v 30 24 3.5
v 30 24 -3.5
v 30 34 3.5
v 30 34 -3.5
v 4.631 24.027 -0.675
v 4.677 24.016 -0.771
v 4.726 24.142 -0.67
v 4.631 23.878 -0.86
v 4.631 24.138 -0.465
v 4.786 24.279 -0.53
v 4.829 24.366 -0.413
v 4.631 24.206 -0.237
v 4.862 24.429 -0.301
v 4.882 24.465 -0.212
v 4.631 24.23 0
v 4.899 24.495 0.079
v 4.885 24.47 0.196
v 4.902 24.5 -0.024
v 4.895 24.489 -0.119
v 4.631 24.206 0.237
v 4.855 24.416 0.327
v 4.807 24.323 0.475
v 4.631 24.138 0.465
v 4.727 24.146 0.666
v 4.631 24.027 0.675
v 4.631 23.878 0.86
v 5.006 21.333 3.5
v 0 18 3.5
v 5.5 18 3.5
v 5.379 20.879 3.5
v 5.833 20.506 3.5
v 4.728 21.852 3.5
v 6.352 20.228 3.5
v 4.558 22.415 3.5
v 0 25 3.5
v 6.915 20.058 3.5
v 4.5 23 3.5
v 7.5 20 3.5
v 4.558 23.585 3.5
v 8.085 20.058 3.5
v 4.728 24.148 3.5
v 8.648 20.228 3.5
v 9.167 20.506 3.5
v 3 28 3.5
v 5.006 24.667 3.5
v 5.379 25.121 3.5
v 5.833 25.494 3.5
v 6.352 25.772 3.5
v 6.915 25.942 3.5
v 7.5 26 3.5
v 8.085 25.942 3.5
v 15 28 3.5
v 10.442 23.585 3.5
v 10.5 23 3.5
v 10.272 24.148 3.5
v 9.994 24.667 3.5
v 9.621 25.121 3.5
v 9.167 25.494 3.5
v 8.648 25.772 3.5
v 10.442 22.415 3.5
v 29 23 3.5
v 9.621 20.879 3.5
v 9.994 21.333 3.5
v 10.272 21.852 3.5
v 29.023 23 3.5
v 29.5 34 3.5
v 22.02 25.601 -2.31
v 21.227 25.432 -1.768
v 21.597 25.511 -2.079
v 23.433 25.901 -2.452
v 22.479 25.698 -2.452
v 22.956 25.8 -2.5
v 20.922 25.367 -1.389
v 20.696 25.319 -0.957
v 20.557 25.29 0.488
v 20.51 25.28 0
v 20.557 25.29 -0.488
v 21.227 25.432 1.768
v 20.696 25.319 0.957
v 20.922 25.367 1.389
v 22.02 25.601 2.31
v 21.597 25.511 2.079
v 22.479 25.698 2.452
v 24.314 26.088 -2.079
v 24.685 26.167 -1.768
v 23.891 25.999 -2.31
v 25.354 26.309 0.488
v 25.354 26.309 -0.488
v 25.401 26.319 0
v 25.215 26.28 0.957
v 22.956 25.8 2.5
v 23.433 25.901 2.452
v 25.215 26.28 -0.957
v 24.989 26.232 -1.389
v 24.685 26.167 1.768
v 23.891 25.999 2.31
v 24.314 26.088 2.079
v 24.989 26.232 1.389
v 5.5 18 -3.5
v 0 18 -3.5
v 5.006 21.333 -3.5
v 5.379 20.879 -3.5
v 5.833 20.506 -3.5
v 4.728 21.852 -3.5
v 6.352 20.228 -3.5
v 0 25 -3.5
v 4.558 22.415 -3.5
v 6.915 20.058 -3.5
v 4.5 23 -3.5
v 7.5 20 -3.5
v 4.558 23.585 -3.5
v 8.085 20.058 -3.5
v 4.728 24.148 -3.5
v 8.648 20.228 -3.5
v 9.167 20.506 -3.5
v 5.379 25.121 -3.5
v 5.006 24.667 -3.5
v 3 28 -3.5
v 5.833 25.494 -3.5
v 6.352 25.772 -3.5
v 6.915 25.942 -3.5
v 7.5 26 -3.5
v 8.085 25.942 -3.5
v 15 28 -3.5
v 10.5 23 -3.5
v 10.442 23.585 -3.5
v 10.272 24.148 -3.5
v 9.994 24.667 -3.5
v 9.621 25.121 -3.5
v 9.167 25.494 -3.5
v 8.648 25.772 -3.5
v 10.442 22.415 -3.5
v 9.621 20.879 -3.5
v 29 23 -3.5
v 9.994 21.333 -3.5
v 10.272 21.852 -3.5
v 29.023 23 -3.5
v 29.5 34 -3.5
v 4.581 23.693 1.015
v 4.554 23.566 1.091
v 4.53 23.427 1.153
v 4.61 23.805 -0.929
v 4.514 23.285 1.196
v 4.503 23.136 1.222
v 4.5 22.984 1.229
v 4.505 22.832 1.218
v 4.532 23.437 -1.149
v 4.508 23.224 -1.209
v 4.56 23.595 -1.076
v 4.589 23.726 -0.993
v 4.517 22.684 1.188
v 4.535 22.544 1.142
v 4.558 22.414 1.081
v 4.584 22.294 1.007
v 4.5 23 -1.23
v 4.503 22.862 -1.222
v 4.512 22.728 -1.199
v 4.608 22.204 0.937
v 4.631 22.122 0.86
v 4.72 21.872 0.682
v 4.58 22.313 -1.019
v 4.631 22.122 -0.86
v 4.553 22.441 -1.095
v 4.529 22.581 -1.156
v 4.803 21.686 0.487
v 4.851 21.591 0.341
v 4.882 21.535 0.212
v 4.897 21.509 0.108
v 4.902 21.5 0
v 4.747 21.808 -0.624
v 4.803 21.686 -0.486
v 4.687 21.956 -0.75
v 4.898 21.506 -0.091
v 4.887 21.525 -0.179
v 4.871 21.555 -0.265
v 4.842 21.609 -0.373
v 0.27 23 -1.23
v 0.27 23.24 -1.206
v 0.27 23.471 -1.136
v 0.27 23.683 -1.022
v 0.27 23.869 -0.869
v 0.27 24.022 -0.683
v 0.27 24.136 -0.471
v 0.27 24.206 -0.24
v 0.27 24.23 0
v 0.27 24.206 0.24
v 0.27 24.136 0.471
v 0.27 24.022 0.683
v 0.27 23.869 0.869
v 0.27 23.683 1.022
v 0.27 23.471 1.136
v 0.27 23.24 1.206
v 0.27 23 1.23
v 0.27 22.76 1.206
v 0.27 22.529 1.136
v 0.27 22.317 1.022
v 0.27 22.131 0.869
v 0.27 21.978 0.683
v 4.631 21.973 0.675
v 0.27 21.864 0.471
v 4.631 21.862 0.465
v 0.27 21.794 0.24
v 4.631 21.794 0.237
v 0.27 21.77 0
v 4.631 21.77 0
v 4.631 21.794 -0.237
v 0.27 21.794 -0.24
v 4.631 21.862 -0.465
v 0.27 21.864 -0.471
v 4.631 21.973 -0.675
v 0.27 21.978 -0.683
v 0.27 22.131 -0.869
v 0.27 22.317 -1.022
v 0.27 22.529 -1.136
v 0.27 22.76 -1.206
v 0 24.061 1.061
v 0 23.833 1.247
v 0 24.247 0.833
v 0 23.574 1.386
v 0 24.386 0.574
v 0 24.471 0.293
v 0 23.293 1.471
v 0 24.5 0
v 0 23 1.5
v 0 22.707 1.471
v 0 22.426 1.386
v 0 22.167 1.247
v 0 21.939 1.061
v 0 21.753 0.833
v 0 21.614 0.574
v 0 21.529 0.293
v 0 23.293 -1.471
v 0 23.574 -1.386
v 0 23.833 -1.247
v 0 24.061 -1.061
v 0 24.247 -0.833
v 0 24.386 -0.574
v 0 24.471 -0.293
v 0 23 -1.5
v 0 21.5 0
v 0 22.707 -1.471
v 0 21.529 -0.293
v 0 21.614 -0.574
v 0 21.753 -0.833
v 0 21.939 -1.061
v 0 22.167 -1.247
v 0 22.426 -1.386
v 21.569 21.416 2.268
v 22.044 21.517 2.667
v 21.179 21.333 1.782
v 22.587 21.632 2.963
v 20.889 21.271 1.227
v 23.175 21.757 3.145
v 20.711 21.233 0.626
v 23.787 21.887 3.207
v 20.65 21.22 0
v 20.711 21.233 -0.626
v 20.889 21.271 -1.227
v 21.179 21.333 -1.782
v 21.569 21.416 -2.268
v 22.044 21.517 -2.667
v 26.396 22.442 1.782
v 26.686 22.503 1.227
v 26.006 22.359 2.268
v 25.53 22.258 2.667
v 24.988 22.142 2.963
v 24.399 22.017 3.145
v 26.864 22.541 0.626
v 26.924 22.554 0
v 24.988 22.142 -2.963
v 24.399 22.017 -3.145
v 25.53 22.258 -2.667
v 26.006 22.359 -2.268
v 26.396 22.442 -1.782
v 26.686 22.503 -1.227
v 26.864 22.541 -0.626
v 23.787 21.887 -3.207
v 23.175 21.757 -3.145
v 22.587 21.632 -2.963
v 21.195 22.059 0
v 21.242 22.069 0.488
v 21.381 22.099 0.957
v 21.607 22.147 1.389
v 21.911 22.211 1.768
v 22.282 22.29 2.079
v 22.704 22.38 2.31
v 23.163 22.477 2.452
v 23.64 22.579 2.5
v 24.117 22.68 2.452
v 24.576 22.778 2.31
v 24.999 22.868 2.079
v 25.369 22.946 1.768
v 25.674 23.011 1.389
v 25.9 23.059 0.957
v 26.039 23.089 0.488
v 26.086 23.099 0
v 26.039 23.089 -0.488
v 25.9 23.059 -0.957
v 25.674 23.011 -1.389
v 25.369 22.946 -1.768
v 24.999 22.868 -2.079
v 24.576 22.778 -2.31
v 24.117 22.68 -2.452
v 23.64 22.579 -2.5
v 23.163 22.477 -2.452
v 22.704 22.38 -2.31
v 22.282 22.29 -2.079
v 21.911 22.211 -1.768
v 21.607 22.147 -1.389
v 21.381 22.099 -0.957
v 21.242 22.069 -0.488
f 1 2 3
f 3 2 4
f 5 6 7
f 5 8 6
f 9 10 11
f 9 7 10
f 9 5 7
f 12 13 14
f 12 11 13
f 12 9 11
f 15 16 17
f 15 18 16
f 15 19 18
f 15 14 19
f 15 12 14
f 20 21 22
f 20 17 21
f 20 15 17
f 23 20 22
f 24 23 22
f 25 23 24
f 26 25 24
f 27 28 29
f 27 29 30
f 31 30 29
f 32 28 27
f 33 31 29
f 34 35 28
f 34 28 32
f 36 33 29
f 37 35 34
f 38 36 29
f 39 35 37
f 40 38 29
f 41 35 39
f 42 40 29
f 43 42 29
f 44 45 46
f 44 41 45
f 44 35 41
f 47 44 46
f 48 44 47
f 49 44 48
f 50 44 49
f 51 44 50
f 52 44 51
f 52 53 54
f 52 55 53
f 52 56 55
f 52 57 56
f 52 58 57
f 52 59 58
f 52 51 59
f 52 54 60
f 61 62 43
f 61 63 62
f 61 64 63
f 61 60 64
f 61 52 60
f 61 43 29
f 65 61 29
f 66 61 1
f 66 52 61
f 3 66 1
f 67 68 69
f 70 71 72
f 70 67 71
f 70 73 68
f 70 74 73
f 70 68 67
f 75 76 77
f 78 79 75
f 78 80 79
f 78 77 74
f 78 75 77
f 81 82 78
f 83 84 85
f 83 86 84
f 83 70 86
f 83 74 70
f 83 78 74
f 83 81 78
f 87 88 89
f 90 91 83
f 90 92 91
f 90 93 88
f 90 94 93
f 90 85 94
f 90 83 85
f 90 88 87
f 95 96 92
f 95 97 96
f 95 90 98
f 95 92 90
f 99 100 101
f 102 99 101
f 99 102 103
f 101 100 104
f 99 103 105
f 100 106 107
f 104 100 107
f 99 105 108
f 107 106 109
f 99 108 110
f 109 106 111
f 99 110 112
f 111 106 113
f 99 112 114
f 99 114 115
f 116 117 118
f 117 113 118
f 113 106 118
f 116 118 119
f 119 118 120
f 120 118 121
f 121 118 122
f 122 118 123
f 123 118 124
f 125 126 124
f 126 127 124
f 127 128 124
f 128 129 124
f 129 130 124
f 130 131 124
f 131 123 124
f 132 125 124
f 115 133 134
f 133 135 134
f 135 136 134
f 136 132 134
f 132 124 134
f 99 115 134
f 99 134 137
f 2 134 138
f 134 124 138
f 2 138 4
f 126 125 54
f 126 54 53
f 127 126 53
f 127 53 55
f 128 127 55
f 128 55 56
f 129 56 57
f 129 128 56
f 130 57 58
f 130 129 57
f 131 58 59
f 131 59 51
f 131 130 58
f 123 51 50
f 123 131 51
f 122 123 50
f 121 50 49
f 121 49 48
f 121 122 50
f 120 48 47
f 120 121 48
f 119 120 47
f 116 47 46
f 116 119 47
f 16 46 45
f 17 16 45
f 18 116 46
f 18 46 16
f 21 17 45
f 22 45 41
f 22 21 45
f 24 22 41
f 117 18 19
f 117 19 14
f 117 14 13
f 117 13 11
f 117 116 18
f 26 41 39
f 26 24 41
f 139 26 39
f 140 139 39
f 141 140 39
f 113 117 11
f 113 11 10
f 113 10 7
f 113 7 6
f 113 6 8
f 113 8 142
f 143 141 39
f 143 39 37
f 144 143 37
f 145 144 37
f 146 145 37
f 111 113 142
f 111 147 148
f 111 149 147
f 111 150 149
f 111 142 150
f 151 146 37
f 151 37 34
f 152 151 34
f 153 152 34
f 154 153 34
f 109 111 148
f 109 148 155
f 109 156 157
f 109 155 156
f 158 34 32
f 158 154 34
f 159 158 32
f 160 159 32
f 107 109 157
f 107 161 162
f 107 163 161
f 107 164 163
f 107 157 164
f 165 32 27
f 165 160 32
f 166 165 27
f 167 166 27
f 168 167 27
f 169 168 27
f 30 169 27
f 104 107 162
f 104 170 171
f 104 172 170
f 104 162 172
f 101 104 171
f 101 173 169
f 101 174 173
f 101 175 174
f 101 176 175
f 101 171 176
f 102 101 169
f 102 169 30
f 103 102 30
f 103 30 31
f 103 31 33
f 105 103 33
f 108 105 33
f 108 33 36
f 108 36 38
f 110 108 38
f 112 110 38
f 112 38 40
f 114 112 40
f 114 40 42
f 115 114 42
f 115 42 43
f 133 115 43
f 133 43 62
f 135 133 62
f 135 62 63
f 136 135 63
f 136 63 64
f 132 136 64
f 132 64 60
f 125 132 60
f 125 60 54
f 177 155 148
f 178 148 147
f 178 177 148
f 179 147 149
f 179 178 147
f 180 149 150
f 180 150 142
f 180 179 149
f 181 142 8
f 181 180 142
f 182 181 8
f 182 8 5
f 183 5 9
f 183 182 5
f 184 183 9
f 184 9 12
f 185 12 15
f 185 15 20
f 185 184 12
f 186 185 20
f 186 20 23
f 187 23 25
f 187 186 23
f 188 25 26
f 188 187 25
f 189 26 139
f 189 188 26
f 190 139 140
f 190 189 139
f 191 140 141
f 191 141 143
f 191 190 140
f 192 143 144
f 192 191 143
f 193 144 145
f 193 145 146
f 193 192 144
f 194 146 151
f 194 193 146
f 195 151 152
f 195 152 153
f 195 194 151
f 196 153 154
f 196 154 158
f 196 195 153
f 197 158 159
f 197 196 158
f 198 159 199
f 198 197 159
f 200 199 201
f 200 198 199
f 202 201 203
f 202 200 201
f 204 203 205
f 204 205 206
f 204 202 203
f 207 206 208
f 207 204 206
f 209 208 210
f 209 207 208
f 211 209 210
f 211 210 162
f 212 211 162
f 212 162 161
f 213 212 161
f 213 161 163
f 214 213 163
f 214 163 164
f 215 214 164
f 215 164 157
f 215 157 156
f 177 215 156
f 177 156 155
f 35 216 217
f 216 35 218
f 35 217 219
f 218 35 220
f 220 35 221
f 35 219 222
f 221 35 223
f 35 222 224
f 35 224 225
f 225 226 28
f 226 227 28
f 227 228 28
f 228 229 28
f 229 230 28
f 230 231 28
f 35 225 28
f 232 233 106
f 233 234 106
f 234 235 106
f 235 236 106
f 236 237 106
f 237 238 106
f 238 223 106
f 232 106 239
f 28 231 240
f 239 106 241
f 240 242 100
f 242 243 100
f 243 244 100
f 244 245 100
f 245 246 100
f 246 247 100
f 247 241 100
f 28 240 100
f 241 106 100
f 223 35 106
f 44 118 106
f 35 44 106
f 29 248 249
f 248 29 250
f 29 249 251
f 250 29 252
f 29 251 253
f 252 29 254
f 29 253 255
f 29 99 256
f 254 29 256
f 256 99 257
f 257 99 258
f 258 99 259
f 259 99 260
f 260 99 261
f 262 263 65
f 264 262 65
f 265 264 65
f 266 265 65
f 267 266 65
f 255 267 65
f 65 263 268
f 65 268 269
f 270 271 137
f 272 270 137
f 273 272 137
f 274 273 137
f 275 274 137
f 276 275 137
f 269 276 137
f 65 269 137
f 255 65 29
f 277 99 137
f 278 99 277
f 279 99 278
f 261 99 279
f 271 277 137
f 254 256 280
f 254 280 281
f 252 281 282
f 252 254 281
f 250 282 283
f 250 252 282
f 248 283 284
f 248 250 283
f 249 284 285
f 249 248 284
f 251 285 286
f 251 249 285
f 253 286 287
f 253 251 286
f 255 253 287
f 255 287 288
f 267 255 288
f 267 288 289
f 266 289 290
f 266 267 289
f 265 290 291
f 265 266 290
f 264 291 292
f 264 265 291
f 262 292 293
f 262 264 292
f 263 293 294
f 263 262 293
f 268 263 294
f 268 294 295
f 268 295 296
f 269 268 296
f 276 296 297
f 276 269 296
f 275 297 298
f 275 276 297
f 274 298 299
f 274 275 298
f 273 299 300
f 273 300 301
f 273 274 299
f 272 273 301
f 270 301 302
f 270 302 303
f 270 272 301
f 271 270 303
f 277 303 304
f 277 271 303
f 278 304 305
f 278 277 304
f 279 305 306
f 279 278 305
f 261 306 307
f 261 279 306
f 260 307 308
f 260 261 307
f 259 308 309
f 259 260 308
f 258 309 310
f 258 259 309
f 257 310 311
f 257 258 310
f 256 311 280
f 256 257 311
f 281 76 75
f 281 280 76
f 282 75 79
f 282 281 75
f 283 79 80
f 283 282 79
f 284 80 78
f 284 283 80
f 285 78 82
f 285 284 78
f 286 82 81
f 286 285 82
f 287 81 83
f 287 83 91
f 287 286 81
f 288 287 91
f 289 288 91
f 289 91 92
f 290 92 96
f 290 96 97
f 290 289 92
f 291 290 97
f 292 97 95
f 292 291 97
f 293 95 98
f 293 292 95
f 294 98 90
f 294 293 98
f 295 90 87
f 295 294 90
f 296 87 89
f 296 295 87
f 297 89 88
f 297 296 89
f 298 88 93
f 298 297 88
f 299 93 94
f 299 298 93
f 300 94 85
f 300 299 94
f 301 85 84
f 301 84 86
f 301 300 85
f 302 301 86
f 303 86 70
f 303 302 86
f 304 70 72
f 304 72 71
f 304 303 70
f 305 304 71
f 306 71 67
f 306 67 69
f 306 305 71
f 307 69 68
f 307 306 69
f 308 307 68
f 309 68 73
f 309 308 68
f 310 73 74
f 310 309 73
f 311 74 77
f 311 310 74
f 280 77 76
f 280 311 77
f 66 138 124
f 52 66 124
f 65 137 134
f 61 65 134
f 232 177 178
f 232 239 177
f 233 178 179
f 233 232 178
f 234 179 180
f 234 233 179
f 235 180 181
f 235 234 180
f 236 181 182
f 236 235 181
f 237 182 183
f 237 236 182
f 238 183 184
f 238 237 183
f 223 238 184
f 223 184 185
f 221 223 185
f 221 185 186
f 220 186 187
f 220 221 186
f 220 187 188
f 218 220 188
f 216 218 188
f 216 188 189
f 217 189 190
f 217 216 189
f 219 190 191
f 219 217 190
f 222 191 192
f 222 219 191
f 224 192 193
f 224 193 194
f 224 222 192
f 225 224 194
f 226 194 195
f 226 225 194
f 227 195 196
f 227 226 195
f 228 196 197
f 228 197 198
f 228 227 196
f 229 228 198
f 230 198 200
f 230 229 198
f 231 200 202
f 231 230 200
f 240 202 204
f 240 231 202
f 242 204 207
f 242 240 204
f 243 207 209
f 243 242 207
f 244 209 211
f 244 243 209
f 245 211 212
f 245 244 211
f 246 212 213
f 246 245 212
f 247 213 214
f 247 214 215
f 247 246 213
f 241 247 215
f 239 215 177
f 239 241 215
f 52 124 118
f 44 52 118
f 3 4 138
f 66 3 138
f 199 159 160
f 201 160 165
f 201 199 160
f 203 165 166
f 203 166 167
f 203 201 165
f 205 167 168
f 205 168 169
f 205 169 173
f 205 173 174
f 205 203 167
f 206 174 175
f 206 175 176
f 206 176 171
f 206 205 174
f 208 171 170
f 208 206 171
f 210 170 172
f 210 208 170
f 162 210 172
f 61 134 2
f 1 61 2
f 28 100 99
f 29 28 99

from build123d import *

# Parameters (mm, degrees)
BOSS_EXTRUDE1_DEPTH      = 3.5
BOSS_EXTRUDE1_DEPTH_BACK = 3.5
CUT_EXTRUDE1_DEPTH       = 3.5
CUT_EXTRUDE1_DEPTH_BACK  = 3.5
SKETCH2_R                = 3


with BuildPart() as part:
    # Sketch1 → Boss-Extrude1 (new, two sides: drawn at the far end of the back side and taken through both)
    with BuildSketch(Plane.XY.offset(-BOSS_EXTRUDE1_DEPTH_BACK)):
        Polygon((0, 25), (0, 18), (5.5, 18), (29.023150547, 23), (29, 23), (30, 24), (30, 34), (29.5, 34), (15, 28), (3, 28), align=None)
    extrude(amount=BOSS_EXTRUDE1_DEPTH + BOSS_EXTRUDE1_DEPTH_BACK)

    # Sketch2 → Cut-Extrude1 (cut, two sides: drawn at the far end of the back side and taken through both)
    with BuildSketch(Plane.XY.offset(-CUT_EXTRUDE1_DEPTH_BACK)):
        with Locations((7.5, 23)):
            Circle(SKETCH2_R)
    extrude(amount=CUT_EXTRUDE1_DEPTH + CUT_EXTRUDE1_DEPTH_BACK, mode=Mode.SUBTRACT)

    # Sketch3 → Cut-Revolve1 (revolve, cut)
    with BuildSketch(Plane.XY):
        Polygon((4.901923789, 23), (4.901923789, 21.5), (4.631423789, 21.7705), (0.2705, 21.7705), (0, 21.5), (0, 23), align=None)
    revolve(axis=Axis((0, 23, 0), (1, 0, 0)), mode=Mode.SUBTRACT)

    # Sketch4 → Cut-Revolve2 (revolve, cut)
    with BuildSketch(Plane.XY):
        Polygon((22.955657634, 25.799676948), (25.401026635, 26.319456175), (26.085657632, 23.098520573), (27.951102449, 21.887086545), (23.967294024, 21.040301924), align=None)
    revolve(axis=Axis((23.967294024, 21.040301924, 0), (-0.20791169081768215, 0.9781476007338221, 0)), mode=Mode.SUBTRACT)


solid = part.part
